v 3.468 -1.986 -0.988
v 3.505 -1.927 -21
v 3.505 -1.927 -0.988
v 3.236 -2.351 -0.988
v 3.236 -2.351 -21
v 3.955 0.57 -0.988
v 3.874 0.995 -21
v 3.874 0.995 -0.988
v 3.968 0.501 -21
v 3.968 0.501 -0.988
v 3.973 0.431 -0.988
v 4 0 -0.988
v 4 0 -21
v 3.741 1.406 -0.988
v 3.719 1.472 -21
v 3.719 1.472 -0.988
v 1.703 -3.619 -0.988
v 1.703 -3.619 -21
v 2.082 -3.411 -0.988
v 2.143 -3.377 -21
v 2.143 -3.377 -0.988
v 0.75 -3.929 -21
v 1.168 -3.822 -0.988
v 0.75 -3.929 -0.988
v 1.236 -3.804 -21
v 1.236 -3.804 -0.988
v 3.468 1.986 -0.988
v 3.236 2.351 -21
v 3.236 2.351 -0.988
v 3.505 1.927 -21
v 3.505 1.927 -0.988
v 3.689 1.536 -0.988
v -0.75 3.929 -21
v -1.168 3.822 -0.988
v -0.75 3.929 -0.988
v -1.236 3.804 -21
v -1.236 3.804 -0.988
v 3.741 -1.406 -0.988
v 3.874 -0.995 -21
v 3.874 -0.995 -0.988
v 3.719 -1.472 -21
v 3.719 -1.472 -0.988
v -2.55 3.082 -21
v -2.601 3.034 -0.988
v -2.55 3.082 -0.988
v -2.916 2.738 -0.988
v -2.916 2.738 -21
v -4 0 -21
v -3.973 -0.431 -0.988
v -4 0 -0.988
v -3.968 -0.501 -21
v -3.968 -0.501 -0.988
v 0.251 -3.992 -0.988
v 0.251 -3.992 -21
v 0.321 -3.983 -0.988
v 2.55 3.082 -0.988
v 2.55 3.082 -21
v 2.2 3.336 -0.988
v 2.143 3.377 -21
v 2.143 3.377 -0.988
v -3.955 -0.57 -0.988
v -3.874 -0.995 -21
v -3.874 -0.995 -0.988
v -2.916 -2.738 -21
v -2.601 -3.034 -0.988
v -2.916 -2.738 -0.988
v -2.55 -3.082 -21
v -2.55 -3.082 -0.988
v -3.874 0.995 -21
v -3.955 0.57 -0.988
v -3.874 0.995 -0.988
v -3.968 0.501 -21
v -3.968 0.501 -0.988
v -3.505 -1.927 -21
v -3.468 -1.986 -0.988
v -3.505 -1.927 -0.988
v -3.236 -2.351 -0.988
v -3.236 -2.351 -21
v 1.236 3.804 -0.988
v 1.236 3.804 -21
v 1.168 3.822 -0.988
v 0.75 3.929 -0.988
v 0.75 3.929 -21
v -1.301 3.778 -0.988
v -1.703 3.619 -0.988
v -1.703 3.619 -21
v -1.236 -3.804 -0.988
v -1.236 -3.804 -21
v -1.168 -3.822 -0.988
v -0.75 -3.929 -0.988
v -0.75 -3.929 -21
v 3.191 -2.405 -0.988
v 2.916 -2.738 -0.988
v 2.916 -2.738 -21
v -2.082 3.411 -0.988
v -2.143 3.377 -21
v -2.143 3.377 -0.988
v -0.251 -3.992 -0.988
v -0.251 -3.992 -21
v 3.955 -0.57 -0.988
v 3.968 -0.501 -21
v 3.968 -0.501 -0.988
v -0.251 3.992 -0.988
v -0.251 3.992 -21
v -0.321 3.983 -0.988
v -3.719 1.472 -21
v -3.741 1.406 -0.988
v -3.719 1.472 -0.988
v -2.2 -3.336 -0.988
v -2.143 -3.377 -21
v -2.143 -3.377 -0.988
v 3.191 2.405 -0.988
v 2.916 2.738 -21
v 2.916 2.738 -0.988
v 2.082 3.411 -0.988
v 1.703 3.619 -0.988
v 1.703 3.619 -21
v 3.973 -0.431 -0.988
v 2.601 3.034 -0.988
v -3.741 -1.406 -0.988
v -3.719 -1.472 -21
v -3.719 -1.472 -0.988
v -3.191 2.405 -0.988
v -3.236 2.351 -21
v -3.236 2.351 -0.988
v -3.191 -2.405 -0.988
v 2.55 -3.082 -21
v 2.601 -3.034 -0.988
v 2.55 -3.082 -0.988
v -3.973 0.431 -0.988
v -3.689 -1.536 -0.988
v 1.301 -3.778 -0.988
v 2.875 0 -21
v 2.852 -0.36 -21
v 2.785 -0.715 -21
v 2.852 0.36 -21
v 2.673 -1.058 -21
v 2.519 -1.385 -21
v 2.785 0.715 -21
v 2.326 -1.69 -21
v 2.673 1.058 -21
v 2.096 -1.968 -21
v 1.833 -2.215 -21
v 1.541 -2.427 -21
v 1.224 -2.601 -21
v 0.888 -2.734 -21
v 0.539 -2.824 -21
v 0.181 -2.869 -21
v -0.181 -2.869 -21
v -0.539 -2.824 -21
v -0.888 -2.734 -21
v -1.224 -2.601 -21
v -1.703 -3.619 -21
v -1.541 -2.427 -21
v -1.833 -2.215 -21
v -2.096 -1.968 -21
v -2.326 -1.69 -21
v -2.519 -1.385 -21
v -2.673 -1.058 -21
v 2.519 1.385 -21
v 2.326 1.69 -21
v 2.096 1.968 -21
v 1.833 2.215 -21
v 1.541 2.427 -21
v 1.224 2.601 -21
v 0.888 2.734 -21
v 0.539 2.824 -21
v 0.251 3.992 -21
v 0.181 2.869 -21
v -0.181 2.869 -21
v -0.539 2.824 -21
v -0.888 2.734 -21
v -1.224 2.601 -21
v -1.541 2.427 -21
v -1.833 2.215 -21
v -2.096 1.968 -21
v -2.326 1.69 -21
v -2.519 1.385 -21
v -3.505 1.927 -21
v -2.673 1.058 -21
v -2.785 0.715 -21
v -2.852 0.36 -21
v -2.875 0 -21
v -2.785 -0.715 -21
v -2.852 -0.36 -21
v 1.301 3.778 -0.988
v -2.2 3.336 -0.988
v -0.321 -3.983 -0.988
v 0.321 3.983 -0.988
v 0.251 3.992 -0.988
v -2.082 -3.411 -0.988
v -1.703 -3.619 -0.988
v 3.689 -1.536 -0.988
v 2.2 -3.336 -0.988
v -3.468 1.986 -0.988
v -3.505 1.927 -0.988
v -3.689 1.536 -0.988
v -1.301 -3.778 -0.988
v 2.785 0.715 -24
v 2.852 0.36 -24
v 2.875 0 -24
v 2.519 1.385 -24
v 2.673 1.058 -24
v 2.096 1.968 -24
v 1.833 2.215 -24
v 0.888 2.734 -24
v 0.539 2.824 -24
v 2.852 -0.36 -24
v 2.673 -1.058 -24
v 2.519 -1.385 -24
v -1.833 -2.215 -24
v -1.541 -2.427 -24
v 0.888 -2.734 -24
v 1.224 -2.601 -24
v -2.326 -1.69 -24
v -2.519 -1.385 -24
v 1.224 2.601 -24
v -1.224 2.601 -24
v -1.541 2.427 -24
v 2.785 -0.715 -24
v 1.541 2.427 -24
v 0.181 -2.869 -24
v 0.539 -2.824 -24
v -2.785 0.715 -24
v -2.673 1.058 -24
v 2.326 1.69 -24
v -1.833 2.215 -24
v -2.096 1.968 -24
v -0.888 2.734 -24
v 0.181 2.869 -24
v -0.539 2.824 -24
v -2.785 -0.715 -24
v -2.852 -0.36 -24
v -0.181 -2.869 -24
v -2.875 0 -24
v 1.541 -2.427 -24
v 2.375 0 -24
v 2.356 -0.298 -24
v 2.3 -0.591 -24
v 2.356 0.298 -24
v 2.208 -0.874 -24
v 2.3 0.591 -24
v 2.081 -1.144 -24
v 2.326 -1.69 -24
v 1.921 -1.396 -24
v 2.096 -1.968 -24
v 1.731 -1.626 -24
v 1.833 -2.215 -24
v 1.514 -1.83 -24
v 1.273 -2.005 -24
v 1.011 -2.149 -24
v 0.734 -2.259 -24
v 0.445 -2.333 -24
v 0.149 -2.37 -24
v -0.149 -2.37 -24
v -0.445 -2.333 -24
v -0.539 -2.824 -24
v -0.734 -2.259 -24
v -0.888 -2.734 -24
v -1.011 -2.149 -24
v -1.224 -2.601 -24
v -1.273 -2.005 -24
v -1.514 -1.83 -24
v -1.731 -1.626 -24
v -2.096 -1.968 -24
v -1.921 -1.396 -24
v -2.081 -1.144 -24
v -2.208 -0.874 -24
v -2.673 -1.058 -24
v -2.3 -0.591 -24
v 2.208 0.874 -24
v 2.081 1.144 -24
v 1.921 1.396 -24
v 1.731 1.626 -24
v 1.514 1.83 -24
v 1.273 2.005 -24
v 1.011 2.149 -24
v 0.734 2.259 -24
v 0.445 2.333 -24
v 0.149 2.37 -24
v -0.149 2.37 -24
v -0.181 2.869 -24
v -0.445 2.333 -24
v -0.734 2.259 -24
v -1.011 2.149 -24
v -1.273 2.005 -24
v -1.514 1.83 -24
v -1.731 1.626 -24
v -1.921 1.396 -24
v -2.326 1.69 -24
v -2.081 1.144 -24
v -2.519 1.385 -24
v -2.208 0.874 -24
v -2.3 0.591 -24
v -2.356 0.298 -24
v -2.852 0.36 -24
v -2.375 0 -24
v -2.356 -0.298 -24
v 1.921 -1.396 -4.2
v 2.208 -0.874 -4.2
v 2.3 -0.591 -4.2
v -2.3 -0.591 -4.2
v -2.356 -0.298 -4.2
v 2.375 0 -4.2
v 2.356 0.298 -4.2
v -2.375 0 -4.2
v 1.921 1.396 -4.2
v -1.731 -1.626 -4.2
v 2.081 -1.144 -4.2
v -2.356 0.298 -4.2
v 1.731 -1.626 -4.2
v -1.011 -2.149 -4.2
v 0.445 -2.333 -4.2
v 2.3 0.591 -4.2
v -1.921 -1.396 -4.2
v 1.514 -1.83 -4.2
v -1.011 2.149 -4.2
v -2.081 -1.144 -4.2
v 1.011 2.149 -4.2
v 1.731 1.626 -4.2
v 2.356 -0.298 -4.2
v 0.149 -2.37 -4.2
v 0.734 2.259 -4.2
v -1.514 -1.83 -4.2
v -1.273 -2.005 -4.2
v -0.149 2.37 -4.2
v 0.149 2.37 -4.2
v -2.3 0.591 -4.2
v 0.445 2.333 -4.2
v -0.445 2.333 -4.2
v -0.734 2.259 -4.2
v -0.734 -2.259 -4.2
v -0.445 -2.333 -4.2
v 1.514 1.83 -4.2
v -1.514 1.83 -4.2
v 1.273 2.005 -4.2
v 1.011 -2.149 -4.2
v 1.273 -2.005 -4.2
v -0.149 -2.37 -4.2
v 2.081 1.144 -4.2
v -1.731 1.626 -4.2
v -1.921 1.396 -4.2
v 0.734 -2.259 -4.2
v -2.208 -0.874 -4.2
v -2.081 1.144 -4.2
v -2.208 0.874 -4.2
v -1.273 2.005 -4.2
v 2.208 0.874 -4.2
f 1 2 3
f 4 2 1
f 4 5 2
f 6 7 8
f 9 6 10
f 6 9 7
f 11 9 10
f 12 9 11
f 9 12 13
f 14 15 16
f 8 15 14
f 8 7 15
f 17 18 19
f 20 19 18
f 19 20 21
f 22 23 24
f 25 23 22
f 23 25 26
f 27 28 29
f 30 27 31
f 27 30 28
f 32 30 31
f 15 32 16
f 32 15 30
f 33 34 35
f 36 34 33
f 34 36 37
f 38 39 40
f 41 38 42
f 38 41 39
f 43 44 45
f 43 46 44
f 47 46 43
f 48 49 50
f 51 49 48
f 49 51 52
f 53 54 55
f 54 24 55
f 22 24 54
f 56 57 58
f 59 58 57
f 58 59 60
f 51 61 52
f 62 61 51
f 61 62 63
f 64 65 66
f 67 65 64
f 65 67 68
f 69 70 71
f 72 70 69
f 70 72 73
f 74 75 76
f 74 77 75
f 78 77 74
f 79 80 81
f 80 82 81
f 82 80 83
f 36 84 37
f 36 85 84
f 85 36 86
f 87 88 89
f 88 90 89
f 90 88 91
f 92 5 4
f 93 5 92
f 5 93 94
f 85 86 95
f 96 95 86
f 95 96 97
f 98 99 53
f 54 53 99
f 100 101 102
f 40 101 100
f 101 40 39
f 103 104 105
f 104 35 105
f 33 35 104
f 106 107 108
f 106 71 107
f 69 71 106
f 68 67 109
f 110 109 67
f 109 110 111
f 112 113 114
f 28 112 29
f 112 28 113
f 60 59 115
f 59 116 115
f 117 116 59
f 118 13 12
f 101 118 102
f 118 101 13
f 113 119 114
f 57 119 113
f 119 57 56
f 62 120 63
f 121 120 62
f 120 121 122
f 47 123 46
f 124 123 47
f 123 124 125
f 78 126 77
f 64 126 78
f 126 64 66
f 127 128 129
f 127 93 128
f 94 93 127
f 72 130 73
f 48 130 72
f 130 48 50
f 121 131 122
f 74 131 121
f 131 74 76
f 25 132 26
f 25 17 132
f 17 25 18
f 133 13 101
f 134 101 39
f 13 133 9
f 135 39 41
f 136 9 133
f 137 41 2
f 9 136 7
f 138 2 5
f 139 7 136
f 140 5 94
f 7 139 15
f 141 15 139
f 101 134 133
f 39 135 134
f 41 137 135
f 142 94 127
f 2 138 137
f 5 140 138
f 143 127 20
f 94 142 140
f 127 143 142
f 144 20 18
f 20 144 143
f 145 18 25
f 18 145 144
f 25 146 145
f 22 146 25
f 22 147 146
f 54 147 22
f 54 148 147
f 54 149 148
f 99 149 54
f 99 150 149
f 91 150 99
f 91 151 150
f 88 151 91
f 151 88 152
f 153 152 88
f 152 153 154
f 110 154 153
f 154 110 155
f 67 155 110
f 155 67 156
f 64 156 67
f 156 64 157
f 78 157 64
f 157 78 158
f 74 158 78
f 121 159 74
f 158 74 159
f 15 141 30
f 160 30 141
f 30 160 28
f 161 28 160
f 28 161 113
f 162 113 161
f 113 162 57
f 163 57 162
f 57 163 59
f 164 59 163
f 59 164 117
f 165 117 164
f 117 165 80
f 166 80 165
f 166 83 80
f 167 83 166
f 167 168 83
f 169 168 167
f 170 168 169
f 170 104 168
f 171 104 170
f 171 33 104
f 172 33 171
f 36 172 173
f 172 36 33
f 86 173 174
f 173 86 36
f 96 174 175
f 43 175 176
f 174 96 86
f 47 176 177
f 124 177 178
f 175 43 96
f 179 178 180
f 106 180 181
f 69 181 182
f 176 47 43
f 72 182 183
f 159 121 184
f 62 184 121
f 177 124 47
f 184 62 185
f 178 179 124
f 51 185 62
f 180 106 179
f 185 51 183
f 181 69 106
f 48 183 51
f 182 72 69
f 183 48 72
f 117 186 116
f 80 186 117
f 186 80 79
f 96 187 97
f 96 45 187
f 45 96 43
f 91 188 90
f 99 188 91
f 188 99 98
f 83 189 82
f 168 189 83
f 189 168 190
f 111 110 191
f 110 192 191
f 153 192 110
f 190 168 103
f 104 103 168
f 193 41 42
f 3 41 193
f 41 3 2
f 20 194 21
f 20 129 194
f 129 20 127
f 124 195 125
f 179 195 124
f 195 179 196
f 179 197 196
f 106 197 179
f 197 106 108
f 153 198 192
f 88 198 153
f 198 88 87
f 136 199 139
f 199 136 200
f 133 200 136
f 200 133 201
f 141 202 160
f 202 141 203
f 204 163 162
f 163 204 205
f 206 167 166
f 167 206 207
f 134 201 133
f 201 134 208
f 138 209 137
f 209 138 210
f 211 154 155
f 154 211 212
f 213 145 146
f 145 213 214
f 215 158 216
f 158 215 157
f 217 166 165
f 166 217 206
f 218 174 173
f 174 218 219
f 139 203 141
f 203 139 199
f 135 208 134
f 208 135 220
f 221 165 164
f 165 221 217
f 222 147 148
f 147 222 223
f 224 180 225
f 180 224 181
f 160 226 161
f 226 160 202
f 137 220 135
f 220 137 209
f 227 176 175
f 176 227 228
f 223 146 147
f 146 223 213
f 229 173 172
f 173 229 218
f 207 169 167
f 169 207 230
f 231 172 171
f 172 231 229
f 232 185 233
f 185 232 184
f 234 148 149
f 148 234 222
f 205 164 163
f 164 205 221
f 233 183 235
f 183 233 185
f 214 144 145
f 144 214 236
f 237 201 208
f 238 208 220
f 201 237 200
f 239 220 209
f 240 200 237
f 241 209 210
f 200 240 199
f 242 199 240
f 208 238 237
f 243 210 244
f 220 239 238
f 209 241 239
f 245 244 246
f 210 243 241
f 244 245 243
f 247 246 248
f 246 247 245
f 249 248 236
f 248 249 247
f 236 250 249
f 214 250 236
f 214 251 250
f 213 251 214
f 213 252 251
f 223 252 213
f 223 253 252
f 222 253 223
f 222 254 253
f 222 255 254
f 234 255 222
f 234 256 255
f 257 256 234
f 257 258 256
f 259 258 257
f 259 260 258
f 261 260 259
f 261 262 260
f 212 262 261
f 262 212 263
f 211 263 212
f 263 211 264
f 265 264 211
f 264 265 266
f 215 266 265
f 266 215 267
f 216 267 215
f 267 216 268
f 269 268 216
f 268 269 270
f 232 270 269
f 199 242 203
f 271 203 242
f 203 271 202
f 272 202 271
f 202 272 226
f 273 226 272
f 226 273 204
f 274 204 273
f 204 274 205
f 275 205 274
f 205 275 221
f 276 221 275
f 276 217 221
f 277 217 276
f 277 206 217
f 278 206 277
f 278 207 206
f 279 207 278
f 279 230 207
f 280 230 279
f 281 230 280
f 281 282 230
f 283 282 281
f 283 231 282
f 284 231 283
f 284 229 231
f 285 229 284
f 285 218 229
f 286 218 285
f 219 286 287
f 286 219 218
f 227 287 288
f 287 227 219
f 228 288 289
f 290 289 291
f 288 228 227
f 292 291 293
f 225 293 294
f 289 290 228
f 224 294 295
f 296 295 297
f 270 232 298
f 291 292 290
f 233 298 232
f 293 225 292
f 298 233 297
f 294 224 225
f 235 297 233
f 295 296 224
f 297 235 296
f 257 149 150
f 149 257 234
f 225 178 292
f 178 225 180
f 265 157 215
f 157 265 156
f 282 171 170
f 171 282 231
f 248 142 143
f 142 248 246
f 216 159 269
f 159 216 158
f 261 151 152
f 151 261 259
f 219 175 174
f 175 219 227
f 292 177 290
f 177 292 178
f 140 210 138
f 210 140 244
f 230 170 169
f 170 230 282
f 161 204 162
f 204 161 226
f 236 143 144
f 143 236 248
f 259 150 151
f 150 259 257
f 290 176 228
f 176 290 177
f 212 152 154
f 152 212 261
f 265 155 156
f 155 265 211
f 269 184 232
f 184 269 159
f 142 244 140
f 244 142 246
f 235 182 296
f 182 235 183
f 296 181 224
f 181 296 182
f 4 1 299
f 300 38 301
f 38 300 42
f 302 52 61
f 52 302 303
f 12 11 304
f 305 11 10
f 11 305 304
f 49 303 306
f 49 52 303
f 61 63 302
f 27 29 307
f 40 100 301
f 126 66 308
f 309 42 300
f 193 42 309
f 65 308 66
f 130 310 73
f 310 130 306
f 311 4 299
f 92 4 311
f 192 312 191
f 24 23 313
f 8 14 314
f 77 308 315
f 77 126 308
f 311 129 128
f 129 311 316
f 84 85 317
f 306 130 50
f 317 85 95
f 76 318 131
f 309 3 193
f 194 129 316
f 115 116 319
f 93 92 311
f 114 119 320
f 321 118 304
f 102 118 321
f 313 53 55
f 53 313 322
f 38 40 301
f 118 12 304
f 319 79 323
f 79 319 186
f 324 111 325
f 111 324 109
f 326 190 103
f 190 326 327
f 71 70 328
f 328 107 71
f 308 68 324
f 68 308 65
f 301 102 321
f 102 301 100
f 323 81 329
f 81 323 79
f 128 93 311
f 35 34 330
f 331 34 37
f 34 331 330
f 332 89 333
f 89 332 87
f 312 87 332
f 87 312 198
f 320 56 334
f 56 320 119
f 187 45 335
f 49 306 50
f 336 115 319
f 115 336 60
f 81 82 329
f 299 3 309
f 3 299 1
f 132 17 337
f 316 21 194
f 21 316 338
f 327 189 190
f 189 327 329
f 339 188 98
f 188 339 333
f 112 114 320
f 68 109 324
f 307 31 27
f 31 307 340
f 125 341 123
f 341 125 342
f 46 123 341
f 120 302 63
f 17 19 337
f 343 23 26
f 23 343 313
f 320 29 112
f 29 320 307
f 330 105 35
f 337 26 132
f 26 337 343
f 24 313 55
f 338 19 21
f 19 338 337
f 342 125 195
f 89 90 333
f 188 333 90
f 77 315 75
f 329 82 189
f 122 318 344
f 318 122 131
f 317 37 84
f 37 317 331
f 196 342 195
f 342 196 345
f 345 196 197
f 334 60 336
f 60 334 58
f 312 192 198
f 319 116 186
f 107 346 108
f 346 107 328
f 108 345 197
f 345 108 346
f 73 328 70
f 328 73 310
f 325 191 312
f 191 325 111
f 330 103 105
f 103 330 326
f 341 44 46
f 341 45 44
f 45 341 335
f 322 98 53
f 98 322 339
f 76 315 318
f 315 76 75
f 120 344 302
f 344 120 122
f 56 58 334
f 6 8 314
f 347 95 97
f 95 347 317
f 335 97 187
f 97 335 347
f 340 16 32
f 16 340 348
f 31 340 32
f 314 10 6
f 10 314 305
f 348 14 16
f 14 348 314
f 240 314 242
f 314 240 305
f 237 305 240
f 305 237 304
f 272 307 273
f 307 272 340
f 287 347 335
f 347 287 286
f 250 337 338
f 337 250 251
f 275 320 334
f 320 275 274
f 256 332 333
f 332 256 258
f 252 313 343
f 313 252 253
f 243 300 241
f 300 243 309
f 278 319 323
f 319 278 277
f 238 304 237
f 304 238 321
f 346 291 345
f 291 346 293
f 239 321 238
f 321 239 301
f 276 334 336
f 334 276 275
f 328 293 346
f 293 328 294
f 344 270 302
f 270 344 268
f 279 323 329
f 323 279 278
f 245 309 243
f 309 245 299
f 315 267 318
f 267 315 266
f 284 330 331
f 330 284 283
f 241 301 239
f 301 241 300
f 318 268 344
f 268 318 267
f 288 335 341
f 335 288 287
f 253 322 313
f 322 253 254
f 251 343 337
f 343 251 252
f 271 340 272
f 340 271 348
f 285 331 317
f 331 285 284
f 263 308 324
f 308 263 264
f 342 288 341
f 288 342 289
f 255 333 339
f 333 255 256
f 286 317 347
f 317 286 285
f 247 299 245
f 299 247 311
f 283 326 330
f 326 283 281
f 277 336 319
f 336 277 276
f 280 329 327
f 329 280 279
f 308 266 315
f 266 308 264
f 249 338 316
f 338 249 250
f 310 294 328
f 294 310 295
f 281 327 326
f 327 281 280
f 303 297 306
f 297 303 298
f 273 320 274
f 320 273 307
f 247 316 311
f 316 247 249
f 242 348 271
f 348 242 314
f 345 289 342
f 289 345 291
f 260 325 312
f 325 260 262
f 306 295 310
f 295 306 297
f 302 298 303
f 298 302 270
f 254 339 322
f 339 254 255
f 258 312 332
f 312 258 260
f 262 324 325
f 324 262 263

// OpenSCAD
$fn = 50;

difference() {
	union() {
		translate(v = [0, 0, -21.0]) {
			cylinder(h = 21, r = 4.0);
		}
		#translate(v = [0, 0, -24.0]) {
			cylinder(h = 24, r = 2.875);
		}
	}
	union() {
		translate(v = [0, 0, 0]) {
			rotate(a = [0, 0, 0]) {
				difference() {
					union() {
						translate(v = [0, 0, -24.0]) {
							cylinder(h = 24, r = 2.25);
						}
						translate(v = [0, 0, -4.2]) {
							cylinder(h = 4.2, r1 = 2.375, r2 = 4.5);
						}
						translate(v = [0, 0, -24.0]) {
							cylinder(h = 24, r = 2.375);
						}
						translate(v = [0, 0, -24.0]) {
							cylinder(h = 24, r = 2.25);
						}
					}
					union();
				}
			}
		}
	}
}
